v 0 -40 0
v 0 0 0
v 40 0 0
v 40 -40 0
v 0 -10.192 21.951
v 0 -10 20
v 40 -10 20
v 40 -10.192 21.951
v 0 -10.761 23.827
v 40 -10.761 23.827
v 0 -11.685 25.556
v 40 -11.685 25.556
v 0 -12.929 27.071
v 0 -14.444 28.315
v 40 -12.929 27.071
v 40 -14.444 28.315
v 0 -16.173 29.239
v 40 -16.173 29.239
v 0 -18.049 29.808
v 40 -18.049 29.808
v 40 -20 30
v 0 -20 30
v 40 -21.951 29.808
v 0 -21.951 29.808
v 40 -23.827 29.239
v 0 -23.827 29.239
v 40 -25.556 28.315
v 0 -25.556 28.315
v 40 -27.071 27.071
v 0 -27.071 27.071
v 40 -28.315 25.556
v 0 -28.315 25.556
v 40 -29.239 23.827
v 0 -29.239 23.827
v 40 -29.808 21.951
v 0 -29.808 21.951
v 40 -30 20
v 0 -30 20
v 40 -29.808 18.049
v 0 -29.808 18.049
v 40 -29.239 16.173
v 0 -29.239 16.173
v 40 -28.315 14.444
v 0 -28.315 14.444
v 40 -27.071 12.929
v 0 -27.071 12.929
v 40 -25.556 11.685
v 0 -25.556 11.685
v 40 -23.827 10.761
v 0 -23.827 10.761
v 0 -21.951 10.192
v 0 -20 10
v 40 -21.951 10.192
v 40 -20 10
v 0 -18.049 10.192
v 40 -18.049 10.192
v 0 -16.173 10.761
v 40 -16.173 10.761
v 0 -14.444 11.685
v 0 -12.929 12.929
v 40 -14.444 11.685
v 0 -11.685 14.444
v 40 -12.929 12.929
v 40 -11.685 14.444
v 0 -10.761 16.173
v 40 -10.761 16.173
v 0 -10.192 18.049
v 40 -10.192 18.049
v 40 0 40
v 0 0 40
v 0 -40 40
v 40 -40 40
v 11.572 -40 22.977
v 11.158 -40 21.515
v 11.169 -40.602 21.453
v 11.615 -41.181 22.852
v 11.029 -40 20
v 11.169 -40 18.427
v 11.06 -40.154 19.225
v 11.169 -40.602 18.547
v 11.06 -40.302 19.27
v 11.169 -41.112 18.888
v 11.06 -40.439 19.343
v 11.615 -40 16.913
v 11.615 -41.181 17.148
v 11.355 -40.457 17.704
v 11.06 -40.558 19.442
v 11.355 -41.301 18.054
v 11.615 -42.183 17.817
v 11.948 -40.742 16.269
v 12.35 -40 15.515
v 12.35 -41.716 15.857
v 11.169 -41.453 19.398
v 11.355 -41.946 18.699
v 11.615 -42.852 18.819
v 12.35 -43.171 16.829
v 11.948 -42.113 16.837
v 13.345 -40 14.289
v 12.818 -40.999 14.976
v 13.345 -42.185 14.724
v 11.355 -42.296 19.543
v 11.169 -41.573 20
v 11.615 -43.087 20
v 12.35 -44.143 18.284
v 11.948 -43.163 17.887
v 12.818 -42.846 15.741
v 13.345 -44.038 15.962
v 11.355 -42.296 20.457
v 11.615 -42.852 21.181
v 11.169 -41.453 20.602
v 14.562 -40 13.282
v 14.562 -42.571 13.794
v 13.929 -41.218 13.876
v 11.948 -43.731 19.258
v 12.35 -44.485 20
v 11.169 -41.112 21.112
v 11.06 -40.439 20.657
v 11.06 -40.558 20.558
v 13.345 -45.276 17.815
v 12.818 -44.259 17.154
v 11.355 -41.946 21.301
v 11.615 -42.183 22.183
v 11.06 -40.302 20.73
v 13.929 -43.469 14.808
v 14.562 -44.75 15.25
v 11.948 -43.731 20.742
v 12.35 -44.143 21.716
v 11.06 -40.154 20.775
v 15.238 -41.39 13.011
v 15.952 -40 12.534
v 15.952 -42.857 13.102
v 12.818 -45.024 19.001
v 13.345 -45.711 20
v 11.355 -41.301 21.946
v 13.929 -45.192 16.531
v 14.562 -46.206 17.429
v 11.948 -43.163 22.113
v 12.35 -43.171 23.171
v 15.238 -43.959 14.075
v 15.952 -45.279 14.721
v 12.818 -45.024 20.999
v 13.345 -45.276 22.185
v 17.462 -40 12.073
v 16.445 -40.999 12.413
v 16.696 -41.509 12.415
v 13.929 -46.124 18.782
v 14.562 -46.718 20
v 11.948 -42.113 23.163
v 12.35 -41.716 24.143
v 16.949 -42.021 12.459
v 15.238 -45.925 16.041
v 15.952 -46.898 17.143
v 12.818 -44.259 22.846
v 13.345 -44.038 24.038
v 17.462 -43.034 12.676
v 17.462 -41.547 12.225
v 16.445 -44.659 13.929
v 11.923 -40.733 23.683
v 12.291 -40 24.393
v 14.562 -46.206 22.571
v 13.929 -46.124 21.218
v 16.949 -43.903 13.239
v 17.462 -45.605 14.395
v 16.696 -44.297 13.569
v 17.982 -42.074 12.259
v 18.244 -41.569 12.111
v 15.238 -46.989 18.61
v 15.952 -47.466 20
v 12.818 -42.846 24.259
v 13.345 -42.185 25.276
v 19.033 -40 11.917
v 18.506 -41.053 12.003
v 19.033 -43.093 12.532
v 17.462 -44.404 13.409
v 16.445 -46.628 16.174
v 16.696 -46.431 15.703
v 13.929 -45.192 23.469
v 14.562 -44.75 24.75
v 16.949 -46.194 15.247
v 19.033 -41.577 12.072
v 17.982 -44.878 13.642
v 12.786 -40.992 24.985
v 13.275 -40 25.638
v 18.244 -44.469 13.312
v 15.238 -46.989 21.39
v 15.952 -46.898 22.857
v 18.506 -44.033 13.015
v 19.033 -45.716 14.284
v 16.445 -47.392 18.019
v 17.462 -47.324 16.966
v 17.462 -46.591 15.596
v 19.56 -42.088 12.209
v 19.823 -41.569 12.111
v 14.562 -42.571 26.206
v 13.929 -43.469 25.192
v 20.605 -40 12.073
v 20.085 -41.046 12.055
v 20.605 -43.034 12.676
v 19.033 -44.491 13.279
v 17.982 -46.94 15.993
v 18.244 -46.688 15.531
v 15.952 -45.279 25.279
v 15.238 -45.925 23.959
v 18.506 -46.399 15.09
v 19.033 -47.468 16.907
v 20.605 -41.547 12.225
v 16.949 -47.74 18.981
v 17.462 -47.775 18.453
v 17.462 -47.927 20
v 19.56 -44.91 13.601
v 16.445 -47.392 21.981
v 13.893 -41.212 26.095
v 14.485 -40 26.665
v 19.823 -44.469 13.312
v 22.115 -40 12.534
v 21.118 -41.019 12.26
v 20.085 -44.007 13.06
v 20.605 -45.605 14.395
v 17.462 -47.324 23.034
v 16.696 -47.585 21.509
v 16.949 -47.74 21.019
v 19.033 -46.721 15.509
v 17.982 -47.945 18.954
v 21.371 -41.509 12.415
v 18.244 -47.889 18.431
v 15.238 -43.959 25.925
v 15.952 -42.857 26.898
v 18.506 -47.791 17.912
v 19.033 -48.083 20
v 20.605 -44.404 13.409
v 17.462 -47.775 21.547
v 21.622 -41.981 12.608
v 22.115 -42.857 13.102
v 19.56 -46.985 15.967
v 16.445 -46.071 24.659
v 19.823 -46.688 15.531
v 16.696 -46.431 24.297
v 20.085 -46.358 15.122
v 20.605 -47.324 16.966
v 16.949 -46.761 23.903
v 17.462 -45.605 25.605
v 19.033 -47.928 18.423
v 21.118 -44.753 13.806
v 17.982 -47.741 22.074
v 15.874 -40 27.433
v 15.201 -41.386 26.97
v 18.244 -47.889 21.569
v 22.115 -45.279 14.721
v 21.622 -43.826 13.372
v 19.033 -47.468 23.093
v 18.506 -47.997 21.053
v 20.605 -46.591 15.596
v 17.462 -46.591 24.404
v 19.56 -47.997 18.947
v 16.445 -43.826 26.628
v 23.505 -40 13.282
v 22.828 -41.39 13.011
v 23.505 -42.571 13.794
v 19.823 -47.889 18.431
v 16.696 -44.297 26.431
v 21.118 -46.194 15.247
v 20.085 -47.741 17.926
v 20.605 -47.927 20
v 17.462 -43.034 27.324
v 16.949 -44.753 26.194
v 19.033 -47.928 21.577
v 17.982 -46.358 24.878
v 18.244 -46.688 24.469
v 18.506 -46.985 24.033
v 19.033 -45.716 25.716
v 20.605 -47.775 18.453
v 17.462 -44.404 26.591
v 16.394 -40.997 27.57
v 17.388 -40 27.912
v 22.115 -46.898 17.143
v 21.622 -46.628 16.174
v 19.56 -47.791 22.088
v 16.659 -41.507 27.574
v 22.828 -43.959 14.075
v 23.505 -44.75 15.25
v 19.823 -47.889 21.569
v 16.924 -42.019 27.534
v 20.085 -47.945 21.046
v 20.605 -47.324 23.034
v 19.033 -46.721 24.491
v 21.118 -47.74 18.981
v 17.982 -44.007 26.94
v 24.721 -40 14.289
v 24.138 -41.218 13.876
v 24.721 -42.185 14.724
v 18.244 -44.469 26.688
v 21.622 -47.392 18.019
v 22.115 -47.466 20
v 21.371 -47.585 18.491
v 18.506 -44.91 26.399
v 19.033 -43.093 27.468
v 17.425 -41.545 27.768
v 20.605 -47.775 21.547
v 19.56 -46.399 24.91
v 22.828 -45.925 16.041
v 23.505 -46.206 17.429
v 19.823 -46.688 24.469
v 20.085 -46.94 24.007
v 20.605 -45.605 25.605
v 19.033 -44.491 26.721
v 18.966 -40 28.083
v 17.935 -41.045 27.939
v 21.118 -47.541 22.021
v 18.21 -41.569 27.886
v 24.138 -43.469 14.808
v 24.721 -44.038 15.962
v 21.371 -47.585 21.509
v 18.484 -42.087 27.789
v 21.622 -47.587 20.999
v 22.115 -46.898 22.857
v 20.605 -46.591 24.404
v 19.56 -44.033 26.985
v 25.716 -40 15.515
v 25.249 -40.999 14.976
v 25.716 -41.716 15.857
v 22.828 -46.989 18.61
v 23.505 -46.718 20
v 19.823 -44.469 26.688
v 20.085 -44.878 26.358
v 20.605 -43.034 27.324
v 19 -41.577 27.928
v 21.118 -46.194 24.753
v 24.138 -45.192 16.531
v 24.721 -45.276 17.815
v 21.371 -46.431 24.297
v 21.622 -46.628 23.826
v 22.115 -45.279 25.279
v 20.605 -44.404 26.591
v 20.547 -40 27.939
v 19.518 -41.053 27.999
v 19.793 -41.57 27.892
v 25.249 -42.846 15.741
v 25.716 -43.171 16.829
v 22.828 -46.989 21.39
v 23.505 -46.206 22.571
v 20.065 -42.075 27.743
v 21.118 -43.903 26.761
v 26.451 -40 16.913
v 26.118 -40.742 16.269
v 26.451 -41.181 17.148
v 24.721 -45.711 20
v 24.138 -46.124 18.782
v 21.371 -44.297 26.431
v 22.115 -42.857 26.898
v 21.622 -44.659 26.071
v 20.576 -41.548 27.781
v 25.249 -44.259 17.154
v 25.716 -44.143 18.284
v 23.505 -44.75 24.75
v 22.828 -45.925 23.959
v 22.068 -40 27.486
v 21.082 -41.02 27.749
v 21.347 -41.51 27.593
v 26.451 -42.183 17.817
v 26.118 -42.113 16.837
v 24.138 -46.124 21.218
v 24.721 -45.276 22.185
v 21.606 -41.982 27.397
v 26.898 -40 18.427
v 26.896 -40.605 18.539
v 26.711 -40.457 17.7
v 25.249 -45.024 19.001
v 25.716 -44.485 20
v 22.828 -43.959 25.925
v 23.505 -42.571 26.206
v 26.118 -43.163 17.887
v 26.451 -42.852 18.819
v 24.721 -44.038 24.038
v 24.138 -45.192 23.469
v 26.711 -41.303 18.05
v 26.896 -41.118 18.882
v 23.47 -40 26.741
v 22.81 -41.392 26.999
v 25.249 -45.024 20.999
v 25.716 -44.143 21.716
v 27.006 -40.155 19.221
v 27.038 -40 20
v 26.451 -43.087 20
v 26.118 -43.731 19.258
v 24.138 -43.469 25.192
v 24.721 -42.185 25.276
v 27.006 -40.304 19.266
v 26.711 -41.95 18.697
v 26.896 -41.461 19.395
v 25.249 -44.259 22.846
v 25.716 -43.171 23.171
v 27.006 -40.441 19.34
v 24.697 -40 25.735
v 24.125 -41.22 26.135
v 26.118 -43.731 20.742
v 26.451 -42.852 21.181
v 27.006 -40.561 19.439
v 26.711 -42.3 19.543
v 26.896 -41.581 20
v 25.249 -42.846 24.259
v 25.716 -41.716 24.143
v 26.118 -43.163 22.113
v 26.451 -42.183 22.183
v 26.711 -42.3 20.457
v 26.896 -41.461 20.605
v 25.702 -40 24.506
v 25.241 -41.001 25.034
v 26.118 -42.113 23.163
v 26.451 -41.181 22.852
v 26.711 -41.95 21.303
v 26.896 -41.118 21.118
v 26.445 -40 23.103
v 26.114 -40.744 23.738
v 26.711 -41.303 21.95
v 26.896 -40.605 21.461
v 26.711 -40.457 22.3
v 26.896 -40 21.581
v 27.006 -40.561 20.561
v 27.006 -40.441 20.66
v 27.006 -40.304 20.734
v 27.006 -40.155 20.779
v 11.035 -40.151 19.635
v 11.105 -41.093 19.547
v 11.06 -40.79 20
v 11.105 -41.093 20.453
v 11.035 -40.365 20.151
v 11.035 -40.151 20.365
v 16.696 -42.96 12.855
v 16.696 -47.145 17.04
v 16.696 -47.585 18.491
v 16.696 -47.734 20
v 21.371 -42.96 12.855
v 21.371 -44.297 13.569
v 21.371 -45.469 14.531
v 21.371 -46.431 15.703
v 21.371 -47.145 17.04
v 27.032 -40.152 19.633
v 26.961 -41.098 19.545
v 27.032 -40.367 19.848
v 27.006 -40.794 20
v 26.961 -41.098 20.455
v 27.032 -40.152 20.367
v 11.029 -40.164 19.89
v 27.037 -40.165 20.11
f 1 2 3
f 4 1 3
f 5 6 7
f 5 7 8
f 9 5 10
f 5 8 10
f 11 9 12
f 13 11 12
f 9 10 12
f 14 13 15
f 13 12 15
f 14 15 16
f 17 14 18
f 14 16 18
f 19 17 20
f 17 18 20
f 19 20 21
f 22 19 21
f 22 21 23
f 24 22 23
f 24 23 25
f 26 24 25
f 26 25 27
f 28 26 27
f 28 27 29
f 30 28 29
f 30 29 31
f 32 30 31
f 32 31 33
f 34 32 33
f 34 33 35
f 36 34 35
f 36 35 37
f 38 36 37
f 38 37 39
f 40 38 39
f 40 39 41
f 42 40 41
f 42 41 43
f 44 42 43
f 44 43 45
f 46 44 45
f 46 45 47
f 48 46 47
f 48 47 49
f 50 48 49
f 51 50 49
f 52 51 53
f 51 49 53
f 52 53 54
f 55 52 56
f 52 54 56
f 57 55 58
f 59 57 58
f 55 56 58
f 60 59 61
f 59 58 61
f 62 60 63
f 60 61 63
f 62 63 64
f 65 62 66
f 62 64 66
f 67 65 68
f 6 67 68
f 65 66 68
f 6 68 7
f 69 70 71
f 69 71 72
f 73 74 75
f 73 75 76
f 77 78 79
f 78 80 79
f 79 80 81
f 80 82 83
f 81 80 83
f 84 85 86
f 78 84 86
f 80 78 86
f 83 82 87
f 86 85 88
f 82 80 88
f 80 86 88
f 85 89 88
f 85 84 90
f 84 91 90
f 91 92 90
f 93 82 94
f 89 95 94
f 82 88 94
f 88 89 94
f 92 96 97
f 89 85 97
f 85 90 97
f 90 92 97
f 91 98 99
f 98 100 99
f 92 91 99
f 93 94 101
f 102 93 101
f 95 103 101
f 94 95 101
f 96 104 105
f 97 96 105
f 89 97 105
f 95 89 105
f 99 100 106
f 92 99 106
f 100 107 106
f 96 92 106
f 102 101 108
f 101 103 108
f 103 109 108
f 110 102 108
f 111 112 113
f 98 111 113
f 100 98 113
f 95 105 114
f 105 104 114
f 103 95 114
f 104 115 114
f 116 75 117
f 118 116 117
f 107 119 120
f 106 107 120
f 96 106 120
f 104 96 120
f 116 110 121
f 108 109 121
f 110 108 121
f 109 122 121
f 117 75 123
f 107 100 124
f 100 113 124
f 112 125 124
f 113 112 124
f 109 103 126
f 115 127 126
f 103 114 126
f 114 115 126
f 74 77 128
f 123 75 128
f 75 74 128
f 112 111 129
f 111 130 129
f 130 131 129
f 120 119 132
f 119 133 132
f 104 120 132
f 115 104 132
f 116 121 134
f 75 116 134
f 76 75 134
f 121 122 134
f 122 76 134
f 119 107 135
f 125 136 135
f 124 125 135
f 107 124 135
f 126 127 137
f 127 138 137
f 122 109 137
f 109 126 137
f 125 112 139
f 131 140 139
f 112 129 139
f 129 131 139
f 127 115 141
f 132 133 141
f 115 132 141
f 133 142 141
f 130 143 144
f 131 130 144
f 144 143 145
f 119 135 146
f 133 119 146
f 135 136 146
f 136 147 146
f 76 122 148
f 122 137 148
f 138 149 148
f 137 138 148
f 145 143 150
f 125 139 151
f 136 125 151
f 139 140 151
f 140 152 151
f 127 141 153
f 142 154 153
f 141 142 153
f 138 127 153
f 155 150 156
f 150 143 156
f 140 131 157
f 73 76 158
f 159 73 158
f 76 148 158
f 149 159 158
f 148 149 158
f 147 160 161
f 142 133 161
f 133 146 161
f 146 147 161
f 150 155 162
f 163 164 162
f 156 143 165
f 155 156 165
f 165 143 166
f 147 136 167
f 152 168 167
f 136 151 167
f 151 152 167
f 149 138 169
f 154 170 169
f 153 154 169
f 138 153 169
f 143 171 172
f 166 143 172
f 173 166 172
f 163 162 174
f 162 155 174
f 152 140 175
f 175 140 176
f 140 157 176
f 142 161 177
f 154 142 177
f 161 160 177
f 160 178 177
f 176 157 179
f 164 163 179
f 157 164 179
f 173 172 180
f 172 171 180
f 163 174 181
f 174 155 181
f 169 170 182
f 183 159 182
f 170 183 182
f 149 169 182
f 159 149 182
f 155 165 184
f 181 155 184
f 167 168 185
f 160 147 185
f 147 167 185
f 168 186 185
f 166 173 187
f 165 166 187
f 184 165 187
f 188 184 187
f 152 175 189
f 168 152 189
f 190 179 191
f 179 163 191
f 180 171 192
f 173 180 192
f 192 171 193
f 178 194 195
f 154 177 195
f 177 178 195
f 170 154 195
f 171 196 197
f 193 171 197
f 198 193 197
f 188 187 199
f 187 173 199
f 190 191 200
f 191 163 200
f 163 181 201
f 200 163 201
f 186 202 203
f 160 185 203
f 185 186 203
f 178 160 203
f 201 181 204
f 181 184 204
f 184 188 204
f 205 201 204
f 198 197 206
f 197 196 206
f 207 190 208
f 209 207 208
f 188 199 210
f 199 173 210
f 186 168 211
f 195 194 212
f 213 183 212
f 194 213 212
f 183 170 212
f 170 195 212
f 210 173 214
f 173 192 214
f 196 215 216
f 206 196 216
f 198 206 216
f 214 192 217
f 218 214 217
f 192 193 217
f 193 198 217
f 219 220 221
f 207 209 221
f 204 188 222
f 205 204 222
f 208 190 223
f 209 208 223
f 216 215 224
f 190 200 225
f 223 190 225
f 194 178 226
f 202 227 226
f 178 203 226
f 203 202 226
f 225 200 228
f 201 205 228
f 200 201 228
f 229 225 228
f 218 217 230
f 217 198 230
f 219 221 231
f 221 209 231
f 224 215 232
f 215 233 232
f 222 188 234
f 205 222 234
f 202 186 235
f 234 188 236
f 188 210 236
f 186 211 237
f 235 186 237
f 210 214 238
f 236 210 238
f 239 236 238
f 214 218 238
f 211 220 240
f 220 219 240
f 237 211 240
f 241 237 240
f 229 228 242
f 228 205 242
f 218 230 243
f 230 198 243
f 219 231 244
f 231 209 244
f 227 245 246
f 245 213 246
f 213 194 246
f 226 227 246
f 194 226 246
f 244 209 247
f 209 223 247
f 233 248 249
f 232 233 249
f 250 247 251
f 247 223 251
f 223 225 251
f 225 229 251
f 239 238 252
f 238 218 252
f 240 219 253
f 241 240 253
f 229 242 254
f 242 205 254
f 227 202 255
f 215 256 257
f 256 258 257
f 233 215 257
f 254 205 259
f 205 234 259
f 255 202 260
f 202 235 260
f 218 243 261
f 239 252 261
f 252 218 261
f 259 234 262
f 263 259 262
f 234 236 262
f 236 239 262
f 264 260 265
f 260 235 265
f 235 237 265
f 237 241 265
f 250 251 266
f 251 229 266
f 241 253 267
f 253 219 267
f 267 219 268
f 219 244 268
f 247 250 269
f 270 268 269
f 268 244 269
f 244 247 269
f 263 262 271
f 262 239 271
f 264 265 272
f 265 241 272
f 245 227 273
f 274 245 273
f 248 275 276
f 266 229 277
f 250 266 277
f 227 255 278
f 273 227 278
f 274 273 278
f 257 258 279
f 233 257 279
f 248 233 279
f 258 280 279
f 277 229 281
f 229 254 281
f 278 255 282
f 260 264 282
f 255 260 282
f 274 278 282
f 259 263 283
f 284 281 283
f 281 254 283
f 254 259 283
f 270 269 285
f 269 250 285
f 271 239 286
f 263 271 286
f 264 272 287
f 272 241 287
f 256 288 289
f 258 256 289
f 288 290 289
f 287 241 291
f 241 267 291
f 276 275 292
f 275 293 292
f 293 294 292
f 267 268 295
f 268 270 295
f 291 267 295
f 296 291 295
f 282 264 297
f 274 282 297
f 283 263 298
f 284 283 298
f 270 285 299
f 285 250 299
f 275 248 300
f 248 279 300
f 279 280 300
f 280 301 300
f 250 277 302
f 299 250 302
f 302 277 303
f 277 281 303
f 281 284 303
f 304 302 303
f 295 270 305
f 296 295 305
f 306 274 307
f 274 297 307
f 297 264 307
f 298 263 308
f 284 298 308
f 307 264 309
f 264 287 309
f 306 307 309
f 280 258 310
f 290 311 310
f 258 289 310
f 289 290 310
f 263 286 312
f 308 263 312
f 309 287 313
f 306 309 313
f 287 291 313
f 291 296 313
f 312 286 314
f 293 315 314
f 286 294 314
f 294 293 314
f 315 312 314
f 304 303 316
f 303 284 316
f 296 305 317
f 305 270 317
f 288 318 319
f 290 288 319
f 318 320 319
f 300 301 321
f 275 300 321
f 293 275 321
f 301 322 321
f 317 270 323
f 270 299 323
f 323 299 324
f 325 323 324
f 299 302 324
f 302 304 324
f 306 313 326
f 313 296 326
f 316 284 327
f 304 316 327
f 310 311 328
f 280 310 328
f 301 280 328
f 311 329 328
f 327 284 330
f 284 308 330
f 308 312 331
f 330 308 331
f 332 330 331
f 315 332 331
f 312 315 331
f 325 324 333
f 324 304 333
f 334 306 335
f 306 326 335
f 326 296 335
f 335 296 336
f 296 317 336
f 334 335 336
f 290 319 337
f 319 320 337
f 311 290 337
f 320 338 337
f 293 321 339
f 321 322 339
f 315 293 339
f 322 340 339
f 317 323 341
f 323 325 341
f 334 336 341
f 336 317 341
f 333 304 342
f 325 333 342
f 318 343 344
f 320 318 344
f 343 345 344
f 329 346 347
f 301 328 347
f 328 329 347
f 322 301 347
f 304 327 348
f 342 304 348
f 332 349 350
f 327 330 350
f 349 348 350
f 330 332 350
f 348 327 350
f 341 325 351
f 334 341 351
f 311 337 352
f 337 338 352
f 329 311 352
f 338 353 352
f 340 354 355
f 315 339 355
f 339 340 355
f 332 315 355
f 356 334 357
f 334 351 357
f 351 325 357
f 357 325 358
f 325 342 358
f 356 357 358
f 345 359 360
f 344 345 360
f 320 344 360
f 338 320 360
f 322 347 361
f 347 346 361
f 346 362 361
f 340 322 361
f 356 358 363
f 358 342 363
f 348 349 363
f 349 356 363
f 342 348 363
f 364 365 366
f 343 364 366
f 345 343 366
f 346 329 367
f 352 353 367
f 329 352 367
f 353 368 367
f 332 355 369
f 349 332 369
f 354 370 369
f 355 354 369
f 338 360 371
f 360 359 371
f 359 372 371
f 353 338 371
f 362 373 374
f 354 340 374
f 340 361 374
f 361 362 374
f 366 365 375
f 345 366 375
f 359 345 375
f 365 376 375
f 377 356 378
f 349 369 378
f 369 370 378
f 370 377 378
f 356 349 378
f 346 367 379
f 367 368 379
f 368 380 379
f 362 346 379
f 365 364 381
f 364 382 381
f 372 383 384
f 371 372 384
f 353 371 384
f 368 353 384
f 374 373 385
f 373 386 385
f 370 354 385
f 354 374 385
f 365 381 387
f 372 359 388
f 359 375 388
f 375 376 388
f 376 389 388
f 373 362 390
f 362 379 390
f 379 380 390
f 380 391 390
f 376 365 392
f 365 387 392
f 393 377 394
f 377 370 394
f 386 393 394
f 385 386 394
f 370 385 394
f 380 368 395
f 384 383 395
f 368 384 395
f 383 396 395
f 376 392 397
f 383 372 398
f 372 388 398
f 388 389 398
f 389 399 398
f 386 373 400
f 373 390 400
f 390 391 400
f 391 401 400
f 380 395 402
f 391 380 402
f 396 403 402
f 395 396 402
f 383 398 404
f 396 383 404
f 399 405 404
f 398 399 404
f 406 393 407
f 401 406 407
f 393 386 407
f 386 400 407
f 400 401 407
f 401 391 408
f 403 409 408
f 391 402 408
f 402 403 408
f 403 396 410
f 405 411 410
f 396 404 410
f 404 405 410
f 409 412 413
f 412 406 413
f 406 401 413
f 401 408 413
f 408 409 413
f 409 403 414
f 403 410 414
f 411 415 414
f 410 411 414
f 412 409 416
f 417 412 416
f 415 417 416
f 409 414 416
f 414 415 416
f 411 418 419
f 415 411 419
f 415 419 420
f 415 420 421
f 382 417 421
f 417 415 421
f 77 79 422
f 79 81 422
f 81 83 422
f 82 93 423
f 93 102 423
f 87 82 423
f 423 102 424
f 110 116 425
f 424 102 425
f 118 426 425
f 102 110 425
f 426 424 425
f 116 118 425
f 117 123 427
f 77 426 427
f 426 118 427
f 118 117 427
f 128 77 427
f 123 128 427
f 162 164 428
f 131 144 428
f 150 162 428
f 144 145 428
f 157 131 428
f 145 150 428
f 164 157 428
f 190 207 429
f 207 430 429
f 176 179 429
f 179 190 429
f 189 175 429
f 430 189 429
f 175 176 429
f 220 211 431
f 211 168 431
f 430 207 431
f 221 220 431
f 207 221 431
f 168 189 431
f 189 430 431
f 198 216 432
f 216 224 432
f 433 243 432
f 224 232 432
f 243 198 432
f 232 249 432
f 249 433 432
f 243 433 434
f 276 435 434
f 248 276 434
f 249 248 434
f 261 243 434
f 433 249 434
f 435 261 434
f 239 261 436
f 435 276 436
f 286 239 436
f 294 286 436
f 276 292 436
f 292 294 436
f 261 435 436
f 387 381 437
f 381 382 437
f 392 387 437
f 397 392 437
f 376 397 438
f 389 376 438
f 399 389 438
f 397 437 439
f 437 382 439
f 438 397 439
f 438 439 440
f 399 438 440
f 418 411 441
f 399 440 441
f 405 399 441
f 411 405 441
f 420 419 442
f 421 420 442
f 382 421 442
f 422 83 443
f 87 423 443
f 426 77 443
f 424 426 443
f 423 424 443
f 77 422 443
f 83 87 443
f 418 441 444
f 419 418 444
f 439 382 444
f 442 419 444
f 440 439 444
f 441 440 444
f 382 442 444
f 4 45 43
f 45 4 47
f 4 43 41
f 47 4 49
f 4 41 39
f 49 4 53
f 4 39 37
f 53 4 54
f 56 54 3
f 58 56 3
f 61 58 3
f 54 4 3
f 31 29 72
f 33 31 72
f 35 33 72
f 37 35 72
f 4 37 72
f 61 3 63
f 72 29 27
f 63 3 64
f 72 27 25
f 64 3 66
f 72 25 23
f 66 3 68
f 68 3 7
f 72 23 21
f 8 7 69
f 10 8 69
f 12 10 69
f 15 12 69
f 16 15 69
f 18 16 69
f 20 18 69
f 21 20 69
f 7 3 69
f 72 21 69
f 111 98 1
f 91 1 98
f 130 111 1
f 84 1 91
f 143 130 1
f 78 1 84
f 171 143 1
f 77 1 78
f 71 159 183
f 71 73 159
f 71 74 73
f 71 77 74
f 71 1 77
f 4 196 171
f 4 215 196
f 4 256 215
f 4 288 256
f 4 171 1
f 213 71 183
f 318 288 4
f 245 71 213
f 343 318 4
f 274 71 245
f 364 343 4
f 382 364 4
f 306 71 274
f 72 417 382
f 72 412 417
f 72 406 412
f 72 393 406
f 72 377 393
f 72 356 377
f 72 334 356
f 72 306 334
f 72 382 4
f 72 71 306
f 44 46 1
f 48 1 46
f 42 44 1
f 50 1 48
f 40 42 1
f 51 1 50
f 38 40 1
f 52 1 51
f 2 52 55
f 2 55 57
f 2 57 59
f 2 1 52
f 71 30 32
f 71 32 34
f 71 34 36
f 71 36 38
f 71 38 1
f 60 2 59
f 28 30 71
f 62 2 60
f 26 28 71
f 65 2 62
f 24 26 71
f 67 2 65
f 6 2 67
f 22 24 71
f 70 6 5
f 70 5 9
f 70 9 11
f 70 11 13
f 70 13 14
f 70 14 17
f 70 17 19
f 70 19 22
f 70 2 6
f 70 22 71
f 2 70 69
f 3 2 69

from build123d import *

# Parameters (mm, degrees)
F0_W     = 40
F0_H     = 40
F1_DEPTH = 40
F2_R     = 10
F3_DEPTH = 40.001


with BuildPart() as f1:
    # F0 (on Front) → F1 (new body)
    with BuildSketch(Plane.XZ):
        with Locations((20, 20)):
            Rectangle(F0_W, F0_H)
    extrude(amount=F1_DEPTH)

    # F2 (on face) → F3 (cut, through all)
    with BuildSketch(Plane.YZ.offset(40)):
        with Locations((-20, 20)):
            Circle(F2_R)
    extrude(amount=-F3_DEPTH, mode=Mode.SUBTRACT)

    # F4 (on face) → F5 (revolve)
    with BuildSketch(Plane.XZ.offset(40)):
        with BuildLine():
            ThreePointArc((11.028599, 20), (19.033267, 11.917013), (27.037935, 20))
            Line((27.037935, 20), (11.028599, 20))
        make_face()
    revolve(axis=Axis((19.033267, -40, 20), (-1, 0, 0)))


solid = f1.part
